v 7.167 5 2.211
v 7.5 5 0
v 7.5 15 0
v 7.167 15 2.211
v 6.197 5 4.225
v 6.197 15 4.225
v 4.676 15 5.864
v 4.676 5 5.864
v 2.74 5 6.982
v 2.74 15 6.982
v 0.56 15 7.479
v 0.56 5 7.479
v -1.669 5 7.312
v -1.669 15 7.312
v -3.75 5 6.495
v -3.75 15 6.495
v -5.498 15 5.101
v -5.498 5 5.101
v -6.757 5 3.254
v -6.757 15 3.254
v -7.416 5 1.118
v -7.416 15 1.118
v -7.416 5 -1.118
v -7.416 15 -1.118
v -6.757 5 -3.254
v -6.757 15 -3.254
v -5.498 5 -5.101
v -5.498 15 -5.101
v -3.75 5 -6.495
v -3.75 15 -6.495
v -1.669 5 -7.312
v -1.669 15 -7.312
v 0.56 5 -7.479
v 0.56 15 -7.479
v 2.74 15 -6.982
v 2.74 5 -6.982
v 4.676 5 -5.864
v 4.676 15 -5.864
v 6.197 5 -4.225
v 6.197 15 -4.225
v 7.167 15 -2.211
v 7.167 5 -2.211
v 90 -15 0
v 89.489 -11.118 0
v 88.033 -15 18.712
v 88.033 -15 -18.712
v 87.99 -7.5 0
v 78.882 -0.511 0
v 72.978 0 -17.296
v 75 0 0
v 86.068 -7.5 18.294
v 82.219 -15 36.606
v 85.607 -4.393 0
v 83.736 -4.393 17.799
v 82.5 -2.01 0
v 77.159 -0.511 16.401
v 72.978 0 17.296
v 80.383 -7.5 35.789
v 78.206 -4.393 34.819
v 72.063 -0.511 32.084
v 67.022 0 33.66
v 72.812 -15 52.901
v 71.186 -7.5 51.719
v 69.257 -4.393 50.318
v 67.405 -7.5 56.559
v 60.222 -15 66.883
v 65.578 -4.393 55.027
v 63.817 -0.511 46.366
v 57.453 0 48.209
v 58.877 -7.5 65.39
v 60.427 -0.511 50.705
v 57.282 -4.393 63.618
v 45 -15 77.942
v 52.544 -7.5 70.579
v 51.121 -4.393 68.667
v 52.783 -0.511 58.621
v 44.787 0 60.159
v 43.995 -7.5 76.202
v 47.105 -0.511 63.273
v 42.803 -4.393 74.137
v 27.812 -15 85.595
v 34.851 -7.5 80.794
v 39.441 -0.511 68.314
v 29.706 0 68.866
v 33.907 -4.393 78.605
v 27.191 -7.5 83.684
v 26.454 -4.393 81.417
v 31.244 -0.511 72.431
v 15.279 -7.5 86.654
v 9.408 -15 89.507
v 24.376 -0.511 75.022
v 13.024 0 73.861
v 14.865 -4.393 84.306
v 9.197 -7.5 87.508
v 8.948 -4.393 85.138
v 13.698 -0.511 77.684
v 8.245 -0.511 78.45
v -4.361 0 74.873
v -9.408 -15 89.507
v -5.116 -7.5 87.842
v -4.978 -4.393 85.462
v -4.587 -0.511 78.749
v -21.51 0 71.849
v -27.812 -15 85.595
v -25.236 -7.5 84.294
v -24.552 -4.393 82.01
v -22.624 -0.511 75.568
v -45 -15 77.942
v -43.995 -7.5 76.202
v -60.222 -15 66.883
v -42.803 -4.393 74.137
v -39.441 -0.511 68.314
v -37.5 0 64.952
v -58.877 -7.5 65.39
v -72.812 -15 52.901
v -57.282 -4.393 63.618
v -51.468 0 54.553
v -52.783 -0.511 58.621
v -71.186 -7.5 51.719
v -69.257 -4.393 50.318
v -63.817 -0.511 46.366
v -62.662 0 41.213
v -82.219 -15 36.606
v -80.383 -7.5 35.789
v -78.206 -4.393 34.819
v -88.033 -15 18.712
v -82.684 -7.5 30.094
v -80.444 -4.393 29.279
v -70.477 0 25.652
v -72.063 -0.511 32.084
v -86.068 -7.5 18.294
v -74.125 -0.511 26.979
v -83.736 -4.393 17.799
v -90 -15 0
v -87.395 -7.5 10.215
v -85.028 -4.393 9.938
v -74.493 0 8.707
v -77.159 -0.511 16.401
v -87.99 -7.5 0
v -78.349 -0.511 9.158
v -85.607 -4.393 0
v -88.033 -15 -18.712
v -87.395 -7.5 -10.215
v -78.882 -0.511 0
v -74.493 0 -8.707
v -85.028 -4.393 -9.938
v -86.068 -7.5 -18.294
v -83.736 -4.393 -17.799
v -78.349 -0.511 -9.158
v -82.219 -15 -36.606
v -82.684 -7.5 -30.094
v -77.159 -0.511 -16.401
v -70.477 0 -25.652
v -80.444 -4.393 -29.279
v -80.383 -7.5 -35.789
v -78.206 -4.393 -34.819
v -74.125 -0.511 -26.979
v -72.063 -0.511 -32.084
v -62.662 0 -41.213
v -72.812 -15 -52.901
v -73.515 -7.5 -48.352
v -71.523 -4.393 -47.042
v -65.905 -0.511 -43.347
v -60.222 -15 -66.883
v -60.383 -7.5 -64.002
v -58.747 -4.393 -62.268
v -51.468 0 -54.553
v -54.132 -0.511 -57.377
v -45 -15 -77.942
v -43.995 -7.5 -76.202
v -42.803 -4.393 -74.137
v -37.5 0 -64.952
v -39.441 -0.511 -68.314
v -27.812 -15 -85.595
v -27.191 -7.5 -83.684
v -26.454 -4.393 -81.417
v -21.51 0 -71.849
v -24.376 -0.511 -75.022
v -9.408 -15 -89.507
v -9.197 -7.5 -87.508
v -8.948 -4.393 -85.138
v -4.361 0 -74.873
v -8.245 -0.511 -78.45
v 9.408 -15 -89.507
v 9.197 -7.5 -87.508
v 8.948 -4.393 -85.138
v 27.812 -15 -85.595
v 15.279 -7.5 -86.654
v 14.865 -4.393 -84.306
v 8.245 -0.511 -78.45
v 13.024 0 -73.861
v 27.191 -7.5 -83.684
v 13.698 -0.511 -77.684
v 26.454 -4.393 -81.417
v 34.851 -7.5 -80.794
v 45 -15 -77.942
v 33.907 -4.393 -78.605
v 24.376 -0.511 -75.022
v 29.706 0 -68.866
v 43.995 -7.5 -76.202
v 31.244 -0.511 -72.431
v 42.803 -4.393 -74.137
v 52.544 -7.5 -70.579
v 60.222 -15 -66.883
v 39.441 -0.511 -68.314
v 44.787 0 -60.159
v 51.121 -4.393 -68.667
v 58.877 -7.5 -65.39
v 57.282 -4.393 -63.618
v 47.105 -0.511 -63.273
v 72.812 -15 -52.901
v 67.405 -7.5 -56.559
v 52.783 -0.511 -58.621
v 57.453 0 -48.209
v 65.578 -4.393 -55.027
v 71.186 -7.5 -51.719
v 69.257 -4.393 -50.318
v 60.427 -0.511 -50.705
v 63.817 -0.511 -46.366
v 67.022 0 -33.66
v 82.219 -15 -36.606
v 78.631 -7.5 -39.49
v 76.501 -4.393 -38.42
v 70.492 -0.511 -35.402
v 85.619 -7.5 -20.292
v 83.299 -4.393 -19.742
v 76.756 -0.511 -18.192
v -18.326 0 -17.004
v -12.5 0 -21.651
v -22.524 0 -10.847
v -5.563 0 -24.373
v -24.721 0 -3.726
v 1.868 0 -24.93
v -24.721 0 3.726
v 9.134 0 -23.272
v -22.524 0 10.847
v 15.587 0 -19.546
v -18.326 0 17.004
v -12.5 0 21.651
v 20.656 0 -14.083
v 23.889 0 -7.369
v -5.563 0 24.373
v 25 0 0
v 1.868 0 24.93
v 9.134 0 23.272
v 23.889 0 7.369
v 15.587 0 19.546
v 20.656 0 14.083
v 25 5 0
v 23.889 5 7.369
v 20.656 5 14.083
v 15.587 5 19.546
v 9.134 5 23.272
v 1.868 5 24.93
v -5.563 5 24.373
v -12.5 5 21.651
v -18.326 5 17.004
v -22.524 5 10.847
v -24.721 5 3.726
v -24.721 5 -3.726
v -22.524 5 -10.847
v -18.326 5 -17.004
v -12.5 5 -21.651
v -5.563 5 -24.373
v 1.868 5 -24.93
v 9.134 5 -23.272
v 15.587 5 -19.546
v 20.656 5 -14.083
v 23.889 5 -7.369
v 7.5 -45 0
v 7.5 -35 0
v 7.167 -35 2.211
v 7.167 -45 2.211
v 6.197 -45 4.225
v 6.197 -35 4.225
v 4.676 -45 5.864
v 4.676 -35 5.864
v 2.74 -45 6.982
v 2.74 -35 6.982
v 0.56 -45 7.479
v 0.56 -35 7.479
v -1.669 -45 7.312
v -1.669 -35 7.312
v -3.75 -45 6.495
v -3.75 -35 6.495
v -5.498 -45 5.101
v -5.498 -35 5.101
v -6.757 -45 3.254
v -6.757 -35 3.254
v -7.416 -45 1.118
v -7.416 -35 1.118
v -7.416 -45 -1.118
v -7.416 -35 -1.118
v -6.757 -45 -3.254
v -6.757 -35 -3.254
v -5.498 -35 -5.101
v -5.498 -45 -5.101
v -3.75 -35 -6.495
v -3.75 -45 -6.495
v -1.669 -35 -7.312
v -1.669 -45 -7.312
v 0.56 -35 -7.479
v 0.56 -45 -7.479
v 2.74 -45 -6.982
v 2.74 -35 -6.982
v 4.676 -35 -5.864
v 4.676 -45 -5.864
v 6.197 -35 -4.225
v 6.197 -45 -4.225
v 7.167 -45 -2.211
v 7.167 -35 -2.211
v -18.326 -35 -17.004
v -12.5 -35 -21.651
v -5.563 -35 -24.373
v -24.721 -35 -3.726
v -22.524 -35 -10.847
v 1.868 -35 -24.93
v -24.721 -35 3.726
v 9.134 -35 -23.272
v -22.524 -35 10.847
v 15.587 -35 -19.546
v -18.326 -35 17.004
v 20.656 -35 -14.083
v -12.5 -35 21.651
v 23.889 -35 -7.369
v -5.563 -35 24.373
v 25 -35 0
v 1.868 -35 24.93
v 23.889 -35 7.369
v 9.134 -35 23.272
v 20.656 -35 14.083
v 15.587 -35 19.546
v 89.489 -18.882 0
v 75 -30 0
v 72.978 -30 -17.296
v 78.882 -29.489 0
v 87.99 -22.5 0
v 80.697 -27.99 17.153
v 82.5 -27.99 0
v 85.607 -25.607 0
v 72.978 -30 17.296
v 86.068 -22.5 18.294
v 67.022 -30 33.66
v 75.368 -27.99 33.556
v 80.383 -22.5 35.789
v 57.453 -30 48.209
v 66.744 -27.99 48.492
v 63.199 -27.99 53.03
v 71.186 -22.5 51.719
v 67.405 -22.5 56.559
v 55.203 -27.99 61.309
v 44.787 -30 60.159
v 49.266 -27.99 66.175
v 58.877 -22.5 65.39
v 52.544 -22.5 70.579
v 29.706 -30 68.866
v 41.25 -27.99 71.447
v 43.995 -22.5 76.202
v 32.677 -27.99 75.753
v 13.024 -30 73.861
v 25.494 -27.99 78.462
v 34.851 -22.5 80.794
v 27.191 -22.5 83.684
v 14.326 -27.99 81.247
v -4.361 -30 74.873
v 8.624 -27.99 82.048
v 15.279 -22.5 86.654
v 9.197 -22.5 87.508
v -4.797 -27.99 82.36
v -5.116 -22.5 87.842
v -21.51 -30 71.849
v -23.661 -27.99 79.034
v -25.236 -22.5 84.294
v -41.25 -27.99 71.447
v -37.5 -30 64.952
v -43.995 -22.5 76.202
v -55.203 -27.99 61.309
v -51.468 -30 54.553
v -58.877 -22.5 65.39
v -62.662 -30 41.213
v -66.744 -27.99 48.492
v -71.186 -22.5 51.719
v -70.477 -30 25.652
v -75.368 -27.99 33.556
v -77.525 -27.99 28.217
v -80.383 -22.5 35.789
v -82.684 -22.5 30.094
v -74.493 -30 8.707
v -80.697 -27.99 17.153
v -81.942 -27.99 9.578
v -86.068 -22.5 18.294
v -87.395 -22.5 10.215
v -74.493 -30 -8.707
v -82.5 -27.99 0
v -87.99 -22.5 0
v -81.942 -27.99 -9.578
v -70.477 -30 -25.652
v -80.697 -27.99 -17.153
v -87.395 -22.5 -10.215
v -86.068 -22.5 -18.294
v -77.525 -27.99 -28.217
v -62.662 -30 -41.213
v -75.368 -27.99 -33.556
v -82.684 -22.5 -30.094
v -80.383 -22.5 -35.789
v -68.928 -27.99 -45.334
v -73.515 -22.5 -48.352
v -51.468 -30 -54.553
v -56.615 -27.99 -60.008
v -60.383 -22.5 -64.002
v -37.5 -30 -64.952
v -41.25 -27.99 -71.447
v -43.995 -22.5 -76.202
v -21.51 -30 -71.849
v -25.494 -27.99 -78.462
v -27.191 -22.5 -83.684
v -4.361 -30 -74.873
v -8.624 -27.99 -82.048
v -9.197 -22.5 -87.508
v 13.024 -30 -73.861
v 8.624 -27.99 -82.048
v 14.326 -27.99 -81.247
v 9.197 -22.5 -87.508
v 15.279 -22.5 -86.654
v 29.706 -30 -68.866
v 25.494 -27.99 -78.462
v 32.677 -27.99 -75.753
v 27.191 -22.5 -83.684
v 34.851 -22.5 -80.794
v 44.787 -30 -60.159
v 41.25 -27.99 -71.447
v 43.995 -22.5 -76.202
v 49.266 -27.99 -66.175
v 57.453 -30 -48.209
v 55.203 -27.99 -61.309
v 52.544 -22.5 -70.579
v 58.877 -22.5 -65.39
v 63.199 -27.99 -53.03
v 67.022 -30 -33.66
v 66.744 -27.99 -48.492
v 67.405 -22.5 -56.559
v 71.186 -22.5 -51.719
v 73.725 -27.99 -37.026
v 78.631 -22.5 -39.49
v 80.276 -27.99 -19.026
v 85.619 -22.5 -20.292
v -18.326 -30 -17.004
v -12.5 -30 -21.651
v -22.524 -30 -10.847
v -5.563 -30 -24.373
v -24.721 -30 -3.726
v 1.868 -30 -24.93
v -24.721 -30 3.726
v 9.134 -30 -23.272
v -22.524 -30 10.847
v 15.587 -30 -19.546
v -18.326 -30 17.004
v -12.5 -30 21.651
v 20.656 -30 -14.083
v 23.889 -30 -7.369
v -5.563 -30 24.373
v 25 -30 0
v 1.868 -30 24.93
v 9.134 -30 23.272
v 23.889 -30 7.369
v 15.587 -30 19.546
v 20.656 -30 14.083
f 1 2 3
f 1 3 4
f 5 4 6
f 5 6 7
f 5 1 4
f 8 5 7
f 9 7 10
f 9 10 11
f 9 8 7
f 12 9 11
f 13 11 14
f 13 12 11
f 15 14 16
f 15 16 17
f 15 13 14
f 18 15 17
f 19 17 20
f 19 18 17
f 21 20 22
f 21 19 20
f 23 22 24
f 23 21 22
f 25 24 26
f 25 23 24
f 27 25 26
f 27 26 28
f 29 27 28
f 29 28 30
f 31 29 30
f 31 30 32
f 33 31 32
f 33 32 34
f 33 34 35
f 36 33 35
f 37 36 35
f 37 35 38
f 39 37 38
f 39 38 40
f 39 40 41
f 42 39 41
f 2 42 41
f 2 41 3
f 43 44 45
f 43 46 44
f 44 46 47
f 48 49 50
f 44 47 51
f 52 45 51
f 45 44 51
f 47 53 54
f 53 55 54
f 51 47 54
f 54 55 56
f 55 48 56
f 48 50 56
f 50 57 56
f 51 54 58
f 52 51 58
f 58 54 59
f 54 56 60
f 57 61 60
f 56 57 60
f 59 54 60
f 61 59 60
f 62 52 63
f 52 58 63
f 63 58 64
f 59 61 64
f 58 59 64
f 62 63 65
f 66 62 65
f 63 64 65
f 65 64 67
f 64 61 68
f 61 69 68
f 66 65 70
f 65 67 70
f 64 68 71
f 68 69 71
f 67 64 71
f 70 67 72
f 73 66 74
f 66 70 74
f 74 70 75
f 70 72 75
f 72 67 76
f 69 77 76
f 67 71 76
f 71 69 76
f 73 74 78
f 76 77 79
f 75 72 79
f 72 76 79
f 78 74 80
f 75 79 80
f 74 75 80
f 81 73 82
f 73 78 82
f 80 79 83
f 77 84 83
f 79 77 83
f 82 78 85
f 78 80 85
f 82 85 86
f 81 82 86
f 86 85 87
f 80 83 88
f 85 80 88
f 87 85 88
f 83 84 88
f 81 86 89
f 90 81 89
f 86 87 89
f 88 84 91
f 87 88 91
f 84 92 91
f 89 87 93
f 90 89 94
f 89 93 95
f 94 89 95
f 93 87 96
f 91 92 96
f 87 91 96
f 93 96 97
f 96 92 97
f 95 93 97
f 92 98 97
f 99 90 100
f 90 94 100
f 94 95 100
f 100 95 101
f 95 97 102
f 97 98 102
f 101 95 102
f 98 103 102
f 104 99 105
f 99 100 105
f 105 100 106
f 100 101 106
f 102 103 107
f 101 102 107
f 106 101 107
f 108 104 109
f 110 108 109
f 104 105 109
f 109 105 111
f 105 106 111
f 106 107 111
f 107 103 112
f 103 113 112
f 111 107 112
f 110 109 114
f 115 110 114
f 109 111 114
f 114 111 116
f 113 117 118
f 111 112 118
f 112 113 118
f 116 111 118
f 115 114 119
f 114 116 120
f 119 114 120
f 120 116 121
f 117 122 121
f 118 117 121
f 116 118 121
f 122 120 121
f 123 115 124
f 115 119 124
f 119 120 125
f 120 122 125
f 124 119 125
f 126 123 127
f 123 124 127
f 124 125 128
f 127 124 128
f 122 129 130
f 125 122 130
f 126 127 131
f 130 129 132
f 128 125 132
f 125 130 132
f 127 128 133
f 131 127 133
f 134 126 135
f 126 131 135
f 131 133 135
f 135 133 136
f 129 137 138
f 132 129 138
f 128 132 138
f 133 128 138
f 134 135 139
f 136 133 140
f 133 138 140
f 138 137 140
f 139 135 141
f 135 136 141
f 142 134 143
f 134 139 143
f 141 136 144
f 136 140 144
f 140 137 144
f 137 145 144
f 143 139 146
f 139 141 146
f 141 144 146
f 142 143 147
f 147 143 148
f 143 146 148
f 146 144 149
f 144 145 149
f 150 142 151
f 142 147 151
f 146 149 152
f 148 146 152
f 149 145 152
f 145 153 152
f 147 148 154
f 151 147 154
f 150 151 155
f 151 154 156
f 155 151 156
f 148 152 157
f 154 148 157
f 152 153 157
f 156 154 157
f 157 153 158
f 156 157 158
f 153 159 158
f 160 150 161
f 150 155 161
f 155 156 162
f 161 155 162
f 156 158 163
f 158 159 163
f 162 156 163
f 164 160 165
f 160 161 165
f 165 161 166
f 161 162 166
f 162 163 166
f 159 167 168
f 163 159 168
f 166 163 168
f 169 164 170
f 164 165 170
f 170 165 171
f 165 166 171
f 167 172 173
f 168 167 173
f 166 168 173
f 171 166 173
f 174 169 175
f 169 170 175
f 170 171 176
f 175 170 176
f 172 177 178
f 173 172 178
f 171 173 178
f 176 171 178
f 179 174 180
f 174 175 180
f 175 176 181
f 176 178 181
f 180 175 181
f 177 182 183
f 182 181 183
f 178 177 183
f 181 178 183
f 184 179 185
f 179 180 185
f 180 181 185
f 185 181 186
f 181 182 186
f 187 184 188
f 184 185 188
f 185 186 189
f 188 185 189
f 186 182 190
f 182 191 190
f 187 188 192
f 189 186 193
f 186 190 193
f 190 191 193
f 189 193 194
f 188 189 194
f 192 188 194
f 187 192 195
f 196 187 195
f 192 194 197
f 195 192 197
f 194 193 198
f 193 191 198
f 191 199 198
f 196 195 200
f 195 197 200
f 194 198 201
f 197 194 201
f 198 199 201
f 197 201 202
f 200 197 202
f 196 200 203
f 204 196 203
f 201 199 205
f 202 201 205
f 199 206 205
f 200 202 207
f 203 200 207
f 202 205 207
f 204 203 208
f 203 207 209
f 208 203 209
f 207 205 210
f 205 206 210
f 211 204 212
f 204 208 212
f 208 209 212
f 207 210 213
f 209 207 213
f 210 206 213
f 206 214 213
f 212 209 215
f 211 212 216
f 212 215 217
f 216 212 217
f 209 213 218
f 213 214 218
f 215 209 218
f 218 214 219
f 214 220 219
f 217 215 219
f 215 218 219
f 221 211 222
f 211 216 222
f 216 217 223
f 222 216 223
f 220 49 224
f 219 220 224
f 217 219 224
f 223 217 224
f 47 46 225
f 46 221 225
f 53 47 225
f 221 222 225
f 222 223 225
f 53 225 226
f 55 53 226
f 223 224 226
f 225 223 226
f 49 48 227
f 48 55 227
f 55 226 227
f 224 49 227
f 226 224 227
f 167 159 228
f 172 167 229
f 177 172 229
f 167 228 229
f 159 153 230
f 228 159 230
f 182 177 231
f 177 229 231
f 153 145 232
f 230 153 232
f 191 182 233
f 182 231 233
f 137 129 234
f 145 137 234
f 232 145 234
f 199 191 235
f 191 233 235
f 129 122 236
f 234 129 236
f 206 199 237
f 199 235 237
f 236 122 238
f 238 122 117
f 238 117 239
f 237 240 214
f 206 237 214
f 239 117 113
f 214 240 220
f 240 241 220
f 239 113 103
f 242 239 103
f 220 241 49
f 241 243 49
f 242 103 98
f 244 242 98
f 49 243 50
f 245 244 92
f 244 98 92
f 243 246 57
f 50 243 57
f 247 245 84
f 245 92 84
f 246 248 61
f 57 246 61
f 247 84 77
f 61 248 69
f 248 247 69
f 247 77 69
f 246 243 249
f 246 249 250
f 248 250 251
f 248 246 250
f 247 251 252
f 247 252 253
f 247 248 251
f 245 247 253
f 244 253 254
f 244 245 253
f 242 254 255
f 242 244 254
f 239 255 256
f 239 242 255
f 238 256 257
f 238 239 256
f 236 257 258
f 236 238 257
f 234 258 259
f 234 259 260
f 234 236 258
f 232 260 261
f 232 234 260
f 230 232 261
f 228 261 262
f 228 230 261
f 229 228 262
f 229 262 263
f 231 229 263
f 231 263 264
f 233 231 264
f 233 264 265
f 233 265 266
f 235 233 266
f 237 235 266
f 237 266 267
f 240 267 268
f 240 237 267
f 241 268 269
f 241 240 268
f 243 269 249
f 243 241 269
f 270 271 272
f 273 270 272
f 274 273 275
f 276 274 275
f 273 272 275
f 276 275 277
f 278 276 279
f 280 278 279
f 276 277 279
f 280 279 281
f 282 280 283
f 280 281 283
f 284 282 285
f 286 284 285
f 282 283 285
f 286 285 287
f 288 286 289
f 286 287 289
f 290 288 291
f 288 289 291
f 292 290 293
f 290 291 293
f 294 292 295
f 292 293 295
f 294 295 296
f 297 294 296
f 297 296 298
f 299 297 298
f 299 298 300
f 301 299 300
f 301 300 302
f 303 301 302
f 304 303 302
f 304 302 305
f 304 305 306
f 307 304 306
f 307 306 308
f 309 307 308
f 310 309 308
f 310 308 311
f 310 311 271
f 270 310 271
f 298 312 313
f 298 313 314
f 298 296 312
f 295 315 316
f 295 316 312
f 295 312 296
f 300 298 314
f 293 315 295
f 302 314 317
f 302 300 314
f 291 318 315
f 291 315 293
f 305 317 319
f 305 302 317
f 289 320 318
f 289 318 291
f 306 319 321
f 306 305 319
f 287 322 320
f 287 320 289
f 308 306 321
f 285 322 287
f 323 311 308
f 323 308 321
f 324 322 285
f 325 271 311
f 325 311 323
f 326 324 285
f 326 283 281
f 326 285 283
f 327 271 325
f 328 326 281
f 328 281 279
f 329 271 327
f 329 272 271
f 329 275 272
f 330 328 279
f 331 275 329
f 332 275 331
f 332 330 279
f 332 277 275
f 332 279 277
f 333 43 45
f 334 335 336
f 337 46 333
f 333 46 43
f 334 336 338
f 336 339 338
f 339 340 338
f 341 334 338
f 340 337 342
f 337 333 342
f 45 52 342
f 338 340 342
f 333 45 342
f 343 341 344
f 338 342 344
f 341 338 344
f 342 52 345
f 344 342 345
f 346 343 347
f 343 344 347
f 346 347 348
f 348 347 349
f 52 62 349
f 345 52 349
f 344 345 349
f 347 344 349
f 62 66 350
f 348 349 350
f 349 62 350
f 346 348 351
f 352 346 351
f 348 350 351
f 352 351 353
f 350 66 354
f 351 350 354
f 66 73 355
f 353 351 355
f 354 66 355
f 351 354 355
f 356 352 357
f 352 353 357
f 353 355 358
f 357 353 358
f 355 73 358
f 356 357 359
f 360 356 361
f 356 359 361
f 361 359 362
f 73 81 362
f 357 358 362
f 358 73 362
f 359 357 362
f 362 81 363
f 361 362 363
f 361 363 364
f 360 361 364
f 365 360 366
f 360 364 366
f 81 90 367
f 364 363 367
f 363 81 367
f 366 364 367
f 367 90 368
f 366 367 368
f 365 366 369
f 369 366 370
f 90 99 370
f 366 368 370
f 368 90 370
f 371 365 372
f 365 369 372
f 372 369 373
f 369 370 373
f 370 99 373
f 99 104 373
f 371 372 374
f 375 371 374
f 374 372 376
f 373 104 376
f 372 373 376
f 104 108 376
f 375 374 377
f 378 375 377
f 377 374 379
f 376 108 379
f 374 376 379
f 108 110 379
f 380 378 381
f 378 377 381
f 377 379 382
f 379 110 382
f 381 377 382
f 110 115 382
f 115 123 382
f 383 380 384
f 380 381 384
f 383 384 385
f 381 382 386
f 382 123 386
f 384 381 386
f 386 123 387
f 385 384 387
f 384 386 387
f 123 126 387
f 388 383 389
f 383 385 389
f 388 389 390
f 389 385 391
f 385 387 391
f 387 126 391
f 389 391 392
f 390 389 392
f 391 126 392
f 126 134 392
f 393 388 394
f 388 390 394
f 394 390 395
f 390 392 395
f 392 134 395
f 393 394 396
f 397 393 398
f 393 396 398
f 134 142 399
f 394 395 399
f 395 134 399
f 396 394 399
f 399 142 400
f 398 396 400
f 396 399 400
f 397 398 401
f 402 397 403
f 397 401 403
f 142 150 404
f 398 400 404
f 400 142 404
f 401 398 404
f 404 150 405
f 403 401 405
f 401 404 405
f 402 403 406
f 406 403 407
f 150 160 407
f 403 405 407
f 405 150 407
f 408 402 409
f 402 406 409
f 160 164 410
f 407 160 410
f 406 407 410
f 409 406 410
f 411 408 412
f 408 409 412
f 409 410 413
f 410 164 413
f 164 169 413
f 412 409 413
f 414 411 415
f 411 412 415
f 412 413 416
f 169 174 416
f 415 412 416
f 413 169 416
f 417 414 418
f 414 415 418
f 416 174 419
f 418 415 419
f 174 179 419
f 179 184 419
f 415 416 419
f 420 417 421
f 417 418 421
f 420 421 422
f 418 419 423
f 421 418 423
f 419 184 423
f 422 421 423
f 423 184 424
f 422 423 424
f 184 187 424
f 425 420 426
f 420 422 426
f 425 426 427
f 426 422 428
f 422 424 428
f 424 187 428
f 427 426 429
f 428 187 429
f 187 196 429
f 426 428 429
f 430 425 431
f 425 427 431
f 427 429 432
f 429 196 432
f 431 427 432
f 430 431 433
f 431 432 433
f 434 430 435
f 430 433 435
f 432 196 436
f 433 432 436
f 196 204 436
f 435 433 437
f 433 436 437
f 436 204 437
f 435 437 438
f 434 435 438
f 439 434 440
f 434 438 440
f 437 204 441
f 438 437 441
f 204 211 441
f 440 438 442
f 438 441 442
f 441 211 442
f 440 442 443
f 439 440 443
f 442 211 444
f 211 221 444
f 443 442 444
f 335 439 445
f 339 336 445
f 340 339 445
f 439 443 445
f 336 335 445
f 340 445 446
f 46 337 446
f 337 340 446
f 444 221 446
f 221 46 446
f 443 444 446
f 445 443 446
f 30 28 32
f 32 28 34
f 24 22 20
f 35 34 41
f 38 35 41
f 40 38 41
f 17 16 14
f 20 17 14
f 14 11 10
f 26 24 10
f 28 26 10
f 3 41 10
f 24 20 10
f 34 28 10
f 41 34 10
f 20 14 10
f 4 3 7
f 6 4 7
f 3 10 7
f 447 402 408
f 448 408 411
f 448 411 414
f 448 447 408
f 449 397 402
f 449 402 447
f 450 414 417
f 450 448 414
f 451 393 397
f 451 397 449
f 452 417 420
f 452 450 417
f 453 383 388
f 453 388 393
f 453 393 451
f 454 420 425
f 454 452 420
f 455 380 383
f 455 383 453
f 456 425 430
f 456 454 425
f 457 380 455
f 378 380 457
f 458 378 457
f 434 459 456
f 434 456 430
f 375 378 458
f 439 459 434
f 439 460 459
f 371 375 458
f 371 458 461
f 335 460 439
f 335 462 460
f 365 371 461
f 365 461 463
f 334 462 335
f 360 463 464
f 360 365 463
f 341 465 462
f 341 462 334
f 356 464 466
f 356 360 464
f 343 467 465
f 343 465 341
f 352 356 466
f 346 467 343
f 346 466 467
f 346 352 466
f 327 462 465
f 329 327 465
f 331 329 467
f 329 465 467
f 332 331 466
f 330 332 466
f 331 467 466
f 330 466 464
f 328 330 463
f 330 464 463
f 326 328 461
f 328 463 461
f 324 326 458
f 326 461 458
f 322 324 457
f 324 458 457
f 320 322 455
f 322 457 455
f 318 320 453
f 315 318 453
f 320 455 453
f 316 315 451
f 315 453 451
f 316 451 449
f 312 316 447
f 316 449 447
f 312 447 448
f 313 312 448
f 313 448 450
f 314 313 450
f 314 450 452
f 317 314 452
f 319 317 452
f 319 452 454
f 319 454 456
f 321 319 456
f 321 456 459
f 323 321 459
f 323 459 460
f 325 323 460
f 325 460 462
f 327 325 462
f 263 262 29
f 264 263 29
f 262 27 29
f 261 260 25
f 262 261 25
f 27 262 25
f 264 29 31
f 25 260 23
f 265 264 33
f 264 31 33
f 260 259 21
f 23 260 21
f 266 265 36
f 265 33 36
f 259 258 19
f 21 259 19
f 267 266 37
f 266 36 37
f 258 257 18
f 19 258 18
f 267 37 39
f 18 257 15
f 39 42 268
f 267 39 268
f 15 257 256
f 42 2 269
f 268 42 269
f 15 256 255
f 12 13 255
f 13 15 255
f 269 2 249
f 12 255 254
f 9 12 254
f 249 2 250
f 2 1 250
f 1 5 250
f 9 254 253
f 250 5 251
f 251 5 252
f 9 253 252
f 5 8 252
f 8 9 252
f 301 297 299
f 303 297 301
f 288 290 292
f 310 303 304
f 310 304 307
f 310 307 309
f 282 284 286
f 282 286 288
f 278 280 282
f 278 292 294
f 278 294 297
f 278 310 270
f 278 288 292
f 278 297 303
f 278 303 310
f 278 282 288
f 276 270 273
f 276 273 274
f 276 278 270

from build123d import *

# Parameters (mm, degrees)
F0_R          = 90
F0_R_2        = 25
F1_DEPTH      = 30
F0_R_3        = 7.5
F2_DEPTH      = 35
F3_R          = 14.99999
F4_DEPTH      = 5
F5_DEPTH      = 15
F5_DEPTH_BACK = 45


# Not quite as in the source:
# - a fillet or chamfer is up to 0.001 mm smaller than in the source, because OpenCascade refuses the exact size


with BuildPart() as f1:
    # F0 (on Front) → F1 (new body)
    with BuildSketch(Plane.XZ):
        Circle(F0_R)
        Circle(F0_R_2, mode=Mode.SUBTRACT)
    extrude(amount=F1_DEPTH)

    # F0 (on Front) → F2 (join)
    with BuildSketch(Plane.XZ):
        Circle(F0_R_2)
        Circle(F0_R_3, mode=Mode.SUBTRACT)
    extrude(amount=F2_DEPTH)

    # F3 (radius 15 in the source; OpenCascade refuses exactly that, so slightly less here)
    f3_edges = [f1.edges().sort_by_distance(p)[0] for p in [
        (-90, -30, 0),
        (-90, 0, 0),
    ]]
    fillet(f3_edges, radius=F3_R)

    # F0 (on Front) → F4 (join)
    with BuildSketch(Plane.XZ):
        Circle(F0_R_2)
        Circle(F0_R_3, mode=Mode.SUBTRACT)
    extrude(amount=-F4_DEPTH)

    # F0 (on Front) → F5 (join, two sides)
    with BuildSketch(Plane.XZ) as f5_sk:
        Circle(F0_R_3)
    extrude(amount=-F5_DEPTH)
    extrude(f5_sk.sketch, amount=F5_DEPTH_BACK)


solid = f1.part
